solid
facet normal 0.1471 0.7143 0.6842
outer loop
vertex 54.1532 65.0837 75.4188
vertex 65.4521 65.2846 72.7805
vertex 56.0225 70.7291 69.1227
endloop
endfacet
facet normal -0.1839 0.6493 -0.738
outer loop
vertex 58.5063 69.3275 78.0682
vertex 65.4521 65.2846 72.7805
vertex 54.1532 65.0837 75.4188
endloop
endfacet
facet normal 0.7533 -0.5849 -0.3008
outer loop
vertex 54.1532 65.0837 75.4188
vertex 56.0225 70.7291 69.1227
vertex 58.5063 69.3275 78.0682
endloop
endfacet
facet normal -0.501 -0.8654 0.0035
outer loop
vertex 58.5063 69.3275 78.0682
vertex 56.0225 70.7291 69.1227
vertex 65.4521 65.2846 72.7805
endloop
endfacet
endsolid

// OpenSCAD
// Auto-generated auxetic polyhedron
points = [
    [56.022543, 70.729075, 69.122687],
    [65.452126, 65.284567, 72.780463],
    [54.153159, 65.083721, 75.418813],
    [58.506331, 69.327507, 78.068158],
];

faces = [
    [0, 1, 2],
    [2, 1, 3],
    [3, 0, 2],
    [1, 0, 3],
];

polyhedron(points = points, faces = faces);
